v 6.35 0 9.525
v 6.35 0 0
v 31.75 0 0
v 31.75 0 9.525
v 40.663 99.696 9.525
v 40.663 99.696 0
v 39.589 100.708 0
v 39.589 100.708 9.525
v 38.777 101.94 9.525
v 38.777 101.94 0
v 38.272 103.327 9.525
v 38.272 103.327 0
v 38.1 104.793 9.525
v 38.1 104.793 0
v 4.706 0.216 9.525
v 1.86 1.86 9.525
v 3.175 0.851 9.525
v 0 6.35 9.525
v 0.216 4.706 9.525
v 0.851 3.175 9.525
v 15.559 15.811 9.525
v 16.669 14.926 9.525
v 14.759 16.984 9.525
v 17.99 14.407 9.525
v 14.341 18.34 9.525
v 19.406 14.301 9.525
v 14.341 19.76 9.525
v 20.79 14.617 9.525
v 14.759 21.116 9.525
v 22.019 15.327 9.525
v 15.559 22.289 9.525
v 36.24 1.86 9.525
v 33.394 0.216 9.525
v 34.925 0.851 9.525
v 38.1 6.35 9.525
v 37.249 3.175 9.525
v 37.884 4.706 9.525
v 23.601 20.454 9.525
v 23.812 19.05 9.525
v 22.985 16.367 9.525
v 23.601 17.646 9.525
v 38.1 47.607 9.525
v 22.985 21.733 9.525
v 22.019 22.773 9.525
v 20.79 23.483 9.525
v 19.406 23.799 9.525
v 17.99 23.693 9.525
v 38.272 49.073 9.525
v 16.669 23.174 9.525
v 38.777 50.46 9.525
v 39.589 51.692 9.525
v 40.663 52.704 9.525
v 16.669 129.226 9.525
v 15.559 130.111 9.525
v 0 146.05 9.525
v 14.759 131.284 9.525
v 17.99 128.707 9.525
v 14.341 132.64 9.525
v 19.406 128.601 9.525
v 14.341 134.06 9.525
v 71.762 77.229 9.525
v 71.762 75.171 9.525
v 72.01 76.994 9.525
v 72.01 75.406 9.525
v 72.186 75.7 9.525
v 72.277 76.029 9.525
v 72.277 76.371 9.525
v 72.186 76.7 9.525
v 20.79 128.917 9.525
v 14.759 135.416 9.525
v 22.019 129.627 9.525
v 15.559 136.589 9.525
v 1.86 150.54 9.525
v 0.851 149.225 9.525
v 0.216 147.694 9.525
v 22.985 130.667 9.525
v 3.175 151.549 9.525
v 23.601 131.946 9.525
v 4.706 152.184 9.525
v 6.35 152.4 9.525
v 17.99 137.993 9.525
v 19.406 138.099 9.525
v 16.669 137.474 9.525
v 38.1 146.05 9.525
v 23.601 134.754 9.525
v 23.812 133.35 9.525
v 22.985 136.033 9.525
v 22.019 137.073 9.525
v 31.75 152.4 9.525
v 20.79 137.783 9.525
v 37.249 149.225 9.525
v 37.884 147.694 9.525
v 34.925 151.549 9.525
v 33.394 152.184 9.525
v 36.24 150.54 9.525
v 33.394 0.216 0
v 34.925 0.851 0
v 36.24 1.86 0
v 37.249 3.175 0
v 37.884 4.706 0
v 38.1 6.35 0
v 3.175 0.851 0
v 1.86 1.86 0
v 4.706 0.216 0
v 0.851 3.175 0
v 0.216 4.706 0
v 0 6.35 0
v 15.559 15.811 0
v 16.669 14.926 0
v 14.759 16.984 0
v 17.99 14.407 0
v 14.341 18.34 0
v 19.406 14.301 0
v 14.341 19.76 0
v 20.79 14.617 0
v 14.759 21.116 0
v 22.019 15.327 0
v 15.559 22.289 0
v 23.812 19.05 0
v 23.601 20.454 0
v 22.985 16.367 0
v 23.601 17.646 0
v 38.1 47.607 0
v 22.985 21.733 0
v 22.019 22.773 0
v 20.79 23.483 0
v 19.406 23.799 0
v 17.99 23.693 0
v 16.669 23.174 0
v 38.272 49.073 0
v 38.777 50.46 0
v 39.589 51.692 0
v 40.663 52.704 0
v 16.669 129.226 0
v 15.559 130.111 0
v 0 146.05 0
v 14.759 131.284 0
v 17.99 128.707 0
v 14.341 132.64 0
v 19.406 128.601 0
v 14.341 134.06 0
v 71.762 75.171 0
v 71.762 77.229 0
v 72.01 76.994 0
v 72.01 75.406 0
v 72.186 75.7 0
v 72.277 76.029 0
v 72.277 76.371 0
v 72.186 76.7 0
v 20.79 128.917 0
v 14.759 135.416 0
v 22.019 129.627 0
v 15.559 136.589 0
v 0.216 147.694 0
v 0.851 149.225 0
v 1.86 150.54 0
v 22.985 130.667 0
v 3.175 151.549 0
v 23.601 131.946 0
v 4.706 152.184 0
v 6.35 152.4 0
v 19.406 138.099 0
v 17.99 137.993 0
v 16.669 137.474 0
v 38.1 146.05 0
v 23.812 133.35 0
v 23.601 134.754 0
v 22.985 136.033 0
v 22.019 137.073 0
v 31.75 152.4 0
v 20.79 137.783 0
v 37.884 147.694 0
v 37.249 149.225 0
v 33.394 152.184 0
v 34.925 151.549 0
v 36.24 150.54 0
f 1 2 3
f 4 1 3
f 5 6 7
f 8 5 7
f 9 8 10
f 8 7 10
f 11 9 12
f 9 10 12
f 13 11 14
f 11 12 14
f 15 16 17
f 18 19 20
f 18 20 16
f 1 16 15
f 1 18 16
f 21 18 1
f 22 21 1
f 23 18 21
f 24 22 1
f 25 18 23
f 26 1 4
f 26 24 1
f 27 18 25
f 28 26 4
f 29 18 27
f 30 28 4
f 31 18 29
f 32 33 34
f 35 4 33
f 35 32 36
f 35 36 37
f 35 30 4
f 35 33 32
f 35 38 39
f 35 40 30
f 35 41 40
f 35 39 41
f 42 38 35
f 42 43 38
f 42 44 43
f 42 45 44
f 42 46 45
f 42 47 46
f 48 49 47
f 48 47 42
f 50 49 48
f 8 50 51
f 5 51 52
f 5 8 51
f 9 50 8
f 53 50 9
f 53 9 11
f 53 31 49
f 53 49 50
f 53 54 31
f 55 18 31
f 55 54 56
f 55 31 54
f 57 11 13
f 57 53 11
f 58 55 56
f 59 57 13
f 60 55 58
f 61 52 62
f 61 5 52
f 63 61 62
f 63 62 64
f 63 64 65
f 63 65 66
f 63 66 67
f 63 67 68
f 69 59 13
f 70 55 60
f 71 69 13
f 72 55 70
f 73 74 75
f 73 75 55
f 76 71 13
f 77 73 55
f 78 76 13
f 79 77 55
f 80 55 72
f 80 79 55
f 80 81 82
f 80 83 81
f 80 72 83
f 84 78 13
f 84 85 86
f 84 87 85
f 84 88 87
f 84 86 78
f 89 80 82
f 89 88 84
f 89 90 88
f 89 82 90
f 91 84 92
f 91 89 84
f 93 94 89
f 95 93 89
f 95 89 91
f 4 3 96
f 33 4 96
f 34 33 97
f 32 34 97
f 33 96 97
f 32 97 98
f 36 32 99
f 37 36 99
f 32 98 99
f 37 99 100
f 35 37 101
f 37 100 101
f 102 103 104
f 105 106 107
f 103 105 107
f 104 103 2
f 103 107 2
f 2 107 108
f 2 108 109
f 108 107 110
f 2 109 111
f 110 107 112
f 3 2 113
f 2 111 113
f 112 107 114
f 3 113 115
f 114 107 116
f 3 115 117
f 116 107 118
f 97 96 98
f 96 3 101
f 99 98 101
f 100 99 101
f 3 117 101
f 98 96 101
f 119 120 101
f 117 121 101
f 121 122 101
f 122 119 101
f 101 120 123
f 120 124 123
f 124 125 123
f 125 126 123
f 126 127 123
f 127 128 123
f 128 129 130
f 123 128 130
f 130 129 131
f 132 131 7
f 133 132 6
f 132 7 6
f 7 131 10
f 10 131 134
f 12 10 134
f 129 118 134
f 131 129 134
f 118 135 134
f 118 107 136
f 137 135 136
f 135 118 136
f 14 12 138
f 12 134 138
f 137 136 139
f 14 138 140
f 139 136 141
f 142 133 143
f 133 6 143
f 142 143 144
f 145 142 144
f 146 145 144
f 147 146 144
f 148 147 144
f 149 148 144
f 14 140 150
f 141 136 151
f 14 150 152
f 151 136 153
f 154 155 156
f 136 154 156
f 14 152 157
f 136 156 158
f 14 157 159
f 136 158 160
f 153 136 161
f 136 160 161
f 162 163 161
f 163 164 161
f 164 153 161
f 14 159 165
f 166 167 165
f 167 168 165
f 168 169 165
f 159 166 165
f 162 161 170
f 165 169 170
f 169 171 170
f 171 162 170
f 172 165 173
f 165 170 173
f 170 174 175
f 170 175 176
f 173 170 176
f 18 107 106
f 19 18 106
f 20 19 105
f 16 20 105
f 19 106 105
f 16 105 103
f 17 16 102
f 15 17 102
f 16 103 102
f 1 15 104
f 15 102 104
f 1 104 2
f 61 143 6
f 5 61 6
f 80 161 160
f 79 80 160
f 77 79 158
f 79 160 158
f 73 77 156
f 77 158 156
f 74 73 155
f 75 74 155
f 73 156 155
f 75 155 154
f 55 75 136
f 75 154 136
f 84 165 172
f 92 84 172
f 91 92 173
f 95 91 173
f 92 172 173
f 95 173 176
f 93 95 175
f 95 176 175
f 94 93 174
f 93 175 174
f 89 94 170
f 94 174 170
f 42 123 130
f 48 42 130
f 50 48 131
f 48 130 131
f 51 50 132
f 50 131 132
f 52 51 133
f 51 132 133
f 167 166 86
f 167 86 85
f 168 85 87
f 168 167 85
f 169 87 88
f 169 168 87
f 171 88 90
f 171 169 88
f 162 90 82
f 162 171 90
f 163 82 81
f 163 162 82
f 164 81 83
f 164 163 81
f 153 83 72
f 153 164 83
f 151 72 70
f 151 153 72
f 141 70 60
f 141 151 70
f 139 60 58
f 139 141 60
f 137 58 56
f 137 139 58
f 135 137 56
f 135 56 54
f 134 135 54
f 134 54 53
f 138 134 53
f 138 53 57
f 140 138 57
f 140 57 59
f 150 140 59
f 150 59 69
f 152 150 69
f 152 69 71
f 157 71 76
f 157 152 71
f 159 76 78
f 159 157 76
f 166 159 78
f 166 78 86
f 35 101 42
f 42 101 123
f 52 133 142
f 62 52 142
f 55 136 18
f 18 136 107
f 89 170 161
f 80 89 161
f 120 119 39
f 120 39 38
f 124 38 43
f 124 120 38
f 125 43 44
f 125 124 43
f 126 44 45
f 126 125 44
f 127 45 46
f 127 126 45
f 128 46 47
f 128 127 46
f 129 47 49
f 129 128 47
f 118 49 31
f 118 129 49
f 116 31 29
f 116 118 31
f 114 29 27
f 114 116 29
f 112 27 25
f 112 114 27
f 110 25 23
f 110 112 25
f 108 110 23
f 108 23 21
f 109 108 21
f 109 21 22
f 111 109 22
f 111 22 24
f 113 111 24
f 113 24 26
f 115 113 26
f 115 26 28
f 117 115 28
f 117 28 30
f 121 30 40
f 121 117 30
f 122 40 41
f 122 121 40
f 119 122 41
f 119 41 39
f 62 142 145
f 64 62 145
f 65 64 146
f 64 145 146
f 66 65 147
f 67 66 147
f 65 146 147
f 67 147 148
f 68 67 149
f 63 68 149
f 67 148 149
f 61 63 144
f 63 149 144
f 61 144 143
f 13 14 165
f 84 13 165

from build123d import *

# Parameters (mm, degrees)
F0_R     = 4.7625
F1_DEPTH = 9.525


with BuildPart() as f1:
    # F0 (on Top) → F1 (new body)
    with BuildSketch(Plane.XY):
        with BuildLine():
            ThreePointArc((0, 6.35), (1.859872, 1.859872), (6.35, 0))
            Line((6.35, 0), (31.75, 0))
            ThreePointArc((31.75, 0), (36.240128, 1.859872), (38.1, 6.35))
            Line((38.1, 6.35), (38.1, 47.606992))
            ThreePointArc((38.1, 47.606992), (38.776838, 50.459662), (40.663064, 52.704208))
            Line((40.663064, 52.704208), (71.762101, 75.17053))
            ThreePointArc((71.762101, 75.17053), (72.2884, 76.2), (71.762101, 77.22947))
            Line((71.762101, 77.22947), (40.663064, 99.695792))
            ThreePointArc((40.663064, 99.695792), (38.776838, 101.940338), (38.1, 104.793008))
            Line((38.1, 104.793008), (38.1, 146.05))
            ThreePointArc((38.1, 146.05), (36.240128, 150.540128), (31.75, 152.4))
            Line((31.75, 152.4), (6.35, 152.4))
            ThreePointArc((6.35, 152.4), (1.859872, 150.540128), (0, 146.05))
            Line((0, 146.05), (0, 6.35))
        make_face()
        with Locations((19.05, 19.05)):
            Circle(F0_R, mode=Mode.SUBTRACT)
        with Locations((19.05, 133.35)):
            Circle(F0_R, mode=Mode.SUBTRACT)
    extrude(amount=F1_DEPTH)


solid = f1.part
